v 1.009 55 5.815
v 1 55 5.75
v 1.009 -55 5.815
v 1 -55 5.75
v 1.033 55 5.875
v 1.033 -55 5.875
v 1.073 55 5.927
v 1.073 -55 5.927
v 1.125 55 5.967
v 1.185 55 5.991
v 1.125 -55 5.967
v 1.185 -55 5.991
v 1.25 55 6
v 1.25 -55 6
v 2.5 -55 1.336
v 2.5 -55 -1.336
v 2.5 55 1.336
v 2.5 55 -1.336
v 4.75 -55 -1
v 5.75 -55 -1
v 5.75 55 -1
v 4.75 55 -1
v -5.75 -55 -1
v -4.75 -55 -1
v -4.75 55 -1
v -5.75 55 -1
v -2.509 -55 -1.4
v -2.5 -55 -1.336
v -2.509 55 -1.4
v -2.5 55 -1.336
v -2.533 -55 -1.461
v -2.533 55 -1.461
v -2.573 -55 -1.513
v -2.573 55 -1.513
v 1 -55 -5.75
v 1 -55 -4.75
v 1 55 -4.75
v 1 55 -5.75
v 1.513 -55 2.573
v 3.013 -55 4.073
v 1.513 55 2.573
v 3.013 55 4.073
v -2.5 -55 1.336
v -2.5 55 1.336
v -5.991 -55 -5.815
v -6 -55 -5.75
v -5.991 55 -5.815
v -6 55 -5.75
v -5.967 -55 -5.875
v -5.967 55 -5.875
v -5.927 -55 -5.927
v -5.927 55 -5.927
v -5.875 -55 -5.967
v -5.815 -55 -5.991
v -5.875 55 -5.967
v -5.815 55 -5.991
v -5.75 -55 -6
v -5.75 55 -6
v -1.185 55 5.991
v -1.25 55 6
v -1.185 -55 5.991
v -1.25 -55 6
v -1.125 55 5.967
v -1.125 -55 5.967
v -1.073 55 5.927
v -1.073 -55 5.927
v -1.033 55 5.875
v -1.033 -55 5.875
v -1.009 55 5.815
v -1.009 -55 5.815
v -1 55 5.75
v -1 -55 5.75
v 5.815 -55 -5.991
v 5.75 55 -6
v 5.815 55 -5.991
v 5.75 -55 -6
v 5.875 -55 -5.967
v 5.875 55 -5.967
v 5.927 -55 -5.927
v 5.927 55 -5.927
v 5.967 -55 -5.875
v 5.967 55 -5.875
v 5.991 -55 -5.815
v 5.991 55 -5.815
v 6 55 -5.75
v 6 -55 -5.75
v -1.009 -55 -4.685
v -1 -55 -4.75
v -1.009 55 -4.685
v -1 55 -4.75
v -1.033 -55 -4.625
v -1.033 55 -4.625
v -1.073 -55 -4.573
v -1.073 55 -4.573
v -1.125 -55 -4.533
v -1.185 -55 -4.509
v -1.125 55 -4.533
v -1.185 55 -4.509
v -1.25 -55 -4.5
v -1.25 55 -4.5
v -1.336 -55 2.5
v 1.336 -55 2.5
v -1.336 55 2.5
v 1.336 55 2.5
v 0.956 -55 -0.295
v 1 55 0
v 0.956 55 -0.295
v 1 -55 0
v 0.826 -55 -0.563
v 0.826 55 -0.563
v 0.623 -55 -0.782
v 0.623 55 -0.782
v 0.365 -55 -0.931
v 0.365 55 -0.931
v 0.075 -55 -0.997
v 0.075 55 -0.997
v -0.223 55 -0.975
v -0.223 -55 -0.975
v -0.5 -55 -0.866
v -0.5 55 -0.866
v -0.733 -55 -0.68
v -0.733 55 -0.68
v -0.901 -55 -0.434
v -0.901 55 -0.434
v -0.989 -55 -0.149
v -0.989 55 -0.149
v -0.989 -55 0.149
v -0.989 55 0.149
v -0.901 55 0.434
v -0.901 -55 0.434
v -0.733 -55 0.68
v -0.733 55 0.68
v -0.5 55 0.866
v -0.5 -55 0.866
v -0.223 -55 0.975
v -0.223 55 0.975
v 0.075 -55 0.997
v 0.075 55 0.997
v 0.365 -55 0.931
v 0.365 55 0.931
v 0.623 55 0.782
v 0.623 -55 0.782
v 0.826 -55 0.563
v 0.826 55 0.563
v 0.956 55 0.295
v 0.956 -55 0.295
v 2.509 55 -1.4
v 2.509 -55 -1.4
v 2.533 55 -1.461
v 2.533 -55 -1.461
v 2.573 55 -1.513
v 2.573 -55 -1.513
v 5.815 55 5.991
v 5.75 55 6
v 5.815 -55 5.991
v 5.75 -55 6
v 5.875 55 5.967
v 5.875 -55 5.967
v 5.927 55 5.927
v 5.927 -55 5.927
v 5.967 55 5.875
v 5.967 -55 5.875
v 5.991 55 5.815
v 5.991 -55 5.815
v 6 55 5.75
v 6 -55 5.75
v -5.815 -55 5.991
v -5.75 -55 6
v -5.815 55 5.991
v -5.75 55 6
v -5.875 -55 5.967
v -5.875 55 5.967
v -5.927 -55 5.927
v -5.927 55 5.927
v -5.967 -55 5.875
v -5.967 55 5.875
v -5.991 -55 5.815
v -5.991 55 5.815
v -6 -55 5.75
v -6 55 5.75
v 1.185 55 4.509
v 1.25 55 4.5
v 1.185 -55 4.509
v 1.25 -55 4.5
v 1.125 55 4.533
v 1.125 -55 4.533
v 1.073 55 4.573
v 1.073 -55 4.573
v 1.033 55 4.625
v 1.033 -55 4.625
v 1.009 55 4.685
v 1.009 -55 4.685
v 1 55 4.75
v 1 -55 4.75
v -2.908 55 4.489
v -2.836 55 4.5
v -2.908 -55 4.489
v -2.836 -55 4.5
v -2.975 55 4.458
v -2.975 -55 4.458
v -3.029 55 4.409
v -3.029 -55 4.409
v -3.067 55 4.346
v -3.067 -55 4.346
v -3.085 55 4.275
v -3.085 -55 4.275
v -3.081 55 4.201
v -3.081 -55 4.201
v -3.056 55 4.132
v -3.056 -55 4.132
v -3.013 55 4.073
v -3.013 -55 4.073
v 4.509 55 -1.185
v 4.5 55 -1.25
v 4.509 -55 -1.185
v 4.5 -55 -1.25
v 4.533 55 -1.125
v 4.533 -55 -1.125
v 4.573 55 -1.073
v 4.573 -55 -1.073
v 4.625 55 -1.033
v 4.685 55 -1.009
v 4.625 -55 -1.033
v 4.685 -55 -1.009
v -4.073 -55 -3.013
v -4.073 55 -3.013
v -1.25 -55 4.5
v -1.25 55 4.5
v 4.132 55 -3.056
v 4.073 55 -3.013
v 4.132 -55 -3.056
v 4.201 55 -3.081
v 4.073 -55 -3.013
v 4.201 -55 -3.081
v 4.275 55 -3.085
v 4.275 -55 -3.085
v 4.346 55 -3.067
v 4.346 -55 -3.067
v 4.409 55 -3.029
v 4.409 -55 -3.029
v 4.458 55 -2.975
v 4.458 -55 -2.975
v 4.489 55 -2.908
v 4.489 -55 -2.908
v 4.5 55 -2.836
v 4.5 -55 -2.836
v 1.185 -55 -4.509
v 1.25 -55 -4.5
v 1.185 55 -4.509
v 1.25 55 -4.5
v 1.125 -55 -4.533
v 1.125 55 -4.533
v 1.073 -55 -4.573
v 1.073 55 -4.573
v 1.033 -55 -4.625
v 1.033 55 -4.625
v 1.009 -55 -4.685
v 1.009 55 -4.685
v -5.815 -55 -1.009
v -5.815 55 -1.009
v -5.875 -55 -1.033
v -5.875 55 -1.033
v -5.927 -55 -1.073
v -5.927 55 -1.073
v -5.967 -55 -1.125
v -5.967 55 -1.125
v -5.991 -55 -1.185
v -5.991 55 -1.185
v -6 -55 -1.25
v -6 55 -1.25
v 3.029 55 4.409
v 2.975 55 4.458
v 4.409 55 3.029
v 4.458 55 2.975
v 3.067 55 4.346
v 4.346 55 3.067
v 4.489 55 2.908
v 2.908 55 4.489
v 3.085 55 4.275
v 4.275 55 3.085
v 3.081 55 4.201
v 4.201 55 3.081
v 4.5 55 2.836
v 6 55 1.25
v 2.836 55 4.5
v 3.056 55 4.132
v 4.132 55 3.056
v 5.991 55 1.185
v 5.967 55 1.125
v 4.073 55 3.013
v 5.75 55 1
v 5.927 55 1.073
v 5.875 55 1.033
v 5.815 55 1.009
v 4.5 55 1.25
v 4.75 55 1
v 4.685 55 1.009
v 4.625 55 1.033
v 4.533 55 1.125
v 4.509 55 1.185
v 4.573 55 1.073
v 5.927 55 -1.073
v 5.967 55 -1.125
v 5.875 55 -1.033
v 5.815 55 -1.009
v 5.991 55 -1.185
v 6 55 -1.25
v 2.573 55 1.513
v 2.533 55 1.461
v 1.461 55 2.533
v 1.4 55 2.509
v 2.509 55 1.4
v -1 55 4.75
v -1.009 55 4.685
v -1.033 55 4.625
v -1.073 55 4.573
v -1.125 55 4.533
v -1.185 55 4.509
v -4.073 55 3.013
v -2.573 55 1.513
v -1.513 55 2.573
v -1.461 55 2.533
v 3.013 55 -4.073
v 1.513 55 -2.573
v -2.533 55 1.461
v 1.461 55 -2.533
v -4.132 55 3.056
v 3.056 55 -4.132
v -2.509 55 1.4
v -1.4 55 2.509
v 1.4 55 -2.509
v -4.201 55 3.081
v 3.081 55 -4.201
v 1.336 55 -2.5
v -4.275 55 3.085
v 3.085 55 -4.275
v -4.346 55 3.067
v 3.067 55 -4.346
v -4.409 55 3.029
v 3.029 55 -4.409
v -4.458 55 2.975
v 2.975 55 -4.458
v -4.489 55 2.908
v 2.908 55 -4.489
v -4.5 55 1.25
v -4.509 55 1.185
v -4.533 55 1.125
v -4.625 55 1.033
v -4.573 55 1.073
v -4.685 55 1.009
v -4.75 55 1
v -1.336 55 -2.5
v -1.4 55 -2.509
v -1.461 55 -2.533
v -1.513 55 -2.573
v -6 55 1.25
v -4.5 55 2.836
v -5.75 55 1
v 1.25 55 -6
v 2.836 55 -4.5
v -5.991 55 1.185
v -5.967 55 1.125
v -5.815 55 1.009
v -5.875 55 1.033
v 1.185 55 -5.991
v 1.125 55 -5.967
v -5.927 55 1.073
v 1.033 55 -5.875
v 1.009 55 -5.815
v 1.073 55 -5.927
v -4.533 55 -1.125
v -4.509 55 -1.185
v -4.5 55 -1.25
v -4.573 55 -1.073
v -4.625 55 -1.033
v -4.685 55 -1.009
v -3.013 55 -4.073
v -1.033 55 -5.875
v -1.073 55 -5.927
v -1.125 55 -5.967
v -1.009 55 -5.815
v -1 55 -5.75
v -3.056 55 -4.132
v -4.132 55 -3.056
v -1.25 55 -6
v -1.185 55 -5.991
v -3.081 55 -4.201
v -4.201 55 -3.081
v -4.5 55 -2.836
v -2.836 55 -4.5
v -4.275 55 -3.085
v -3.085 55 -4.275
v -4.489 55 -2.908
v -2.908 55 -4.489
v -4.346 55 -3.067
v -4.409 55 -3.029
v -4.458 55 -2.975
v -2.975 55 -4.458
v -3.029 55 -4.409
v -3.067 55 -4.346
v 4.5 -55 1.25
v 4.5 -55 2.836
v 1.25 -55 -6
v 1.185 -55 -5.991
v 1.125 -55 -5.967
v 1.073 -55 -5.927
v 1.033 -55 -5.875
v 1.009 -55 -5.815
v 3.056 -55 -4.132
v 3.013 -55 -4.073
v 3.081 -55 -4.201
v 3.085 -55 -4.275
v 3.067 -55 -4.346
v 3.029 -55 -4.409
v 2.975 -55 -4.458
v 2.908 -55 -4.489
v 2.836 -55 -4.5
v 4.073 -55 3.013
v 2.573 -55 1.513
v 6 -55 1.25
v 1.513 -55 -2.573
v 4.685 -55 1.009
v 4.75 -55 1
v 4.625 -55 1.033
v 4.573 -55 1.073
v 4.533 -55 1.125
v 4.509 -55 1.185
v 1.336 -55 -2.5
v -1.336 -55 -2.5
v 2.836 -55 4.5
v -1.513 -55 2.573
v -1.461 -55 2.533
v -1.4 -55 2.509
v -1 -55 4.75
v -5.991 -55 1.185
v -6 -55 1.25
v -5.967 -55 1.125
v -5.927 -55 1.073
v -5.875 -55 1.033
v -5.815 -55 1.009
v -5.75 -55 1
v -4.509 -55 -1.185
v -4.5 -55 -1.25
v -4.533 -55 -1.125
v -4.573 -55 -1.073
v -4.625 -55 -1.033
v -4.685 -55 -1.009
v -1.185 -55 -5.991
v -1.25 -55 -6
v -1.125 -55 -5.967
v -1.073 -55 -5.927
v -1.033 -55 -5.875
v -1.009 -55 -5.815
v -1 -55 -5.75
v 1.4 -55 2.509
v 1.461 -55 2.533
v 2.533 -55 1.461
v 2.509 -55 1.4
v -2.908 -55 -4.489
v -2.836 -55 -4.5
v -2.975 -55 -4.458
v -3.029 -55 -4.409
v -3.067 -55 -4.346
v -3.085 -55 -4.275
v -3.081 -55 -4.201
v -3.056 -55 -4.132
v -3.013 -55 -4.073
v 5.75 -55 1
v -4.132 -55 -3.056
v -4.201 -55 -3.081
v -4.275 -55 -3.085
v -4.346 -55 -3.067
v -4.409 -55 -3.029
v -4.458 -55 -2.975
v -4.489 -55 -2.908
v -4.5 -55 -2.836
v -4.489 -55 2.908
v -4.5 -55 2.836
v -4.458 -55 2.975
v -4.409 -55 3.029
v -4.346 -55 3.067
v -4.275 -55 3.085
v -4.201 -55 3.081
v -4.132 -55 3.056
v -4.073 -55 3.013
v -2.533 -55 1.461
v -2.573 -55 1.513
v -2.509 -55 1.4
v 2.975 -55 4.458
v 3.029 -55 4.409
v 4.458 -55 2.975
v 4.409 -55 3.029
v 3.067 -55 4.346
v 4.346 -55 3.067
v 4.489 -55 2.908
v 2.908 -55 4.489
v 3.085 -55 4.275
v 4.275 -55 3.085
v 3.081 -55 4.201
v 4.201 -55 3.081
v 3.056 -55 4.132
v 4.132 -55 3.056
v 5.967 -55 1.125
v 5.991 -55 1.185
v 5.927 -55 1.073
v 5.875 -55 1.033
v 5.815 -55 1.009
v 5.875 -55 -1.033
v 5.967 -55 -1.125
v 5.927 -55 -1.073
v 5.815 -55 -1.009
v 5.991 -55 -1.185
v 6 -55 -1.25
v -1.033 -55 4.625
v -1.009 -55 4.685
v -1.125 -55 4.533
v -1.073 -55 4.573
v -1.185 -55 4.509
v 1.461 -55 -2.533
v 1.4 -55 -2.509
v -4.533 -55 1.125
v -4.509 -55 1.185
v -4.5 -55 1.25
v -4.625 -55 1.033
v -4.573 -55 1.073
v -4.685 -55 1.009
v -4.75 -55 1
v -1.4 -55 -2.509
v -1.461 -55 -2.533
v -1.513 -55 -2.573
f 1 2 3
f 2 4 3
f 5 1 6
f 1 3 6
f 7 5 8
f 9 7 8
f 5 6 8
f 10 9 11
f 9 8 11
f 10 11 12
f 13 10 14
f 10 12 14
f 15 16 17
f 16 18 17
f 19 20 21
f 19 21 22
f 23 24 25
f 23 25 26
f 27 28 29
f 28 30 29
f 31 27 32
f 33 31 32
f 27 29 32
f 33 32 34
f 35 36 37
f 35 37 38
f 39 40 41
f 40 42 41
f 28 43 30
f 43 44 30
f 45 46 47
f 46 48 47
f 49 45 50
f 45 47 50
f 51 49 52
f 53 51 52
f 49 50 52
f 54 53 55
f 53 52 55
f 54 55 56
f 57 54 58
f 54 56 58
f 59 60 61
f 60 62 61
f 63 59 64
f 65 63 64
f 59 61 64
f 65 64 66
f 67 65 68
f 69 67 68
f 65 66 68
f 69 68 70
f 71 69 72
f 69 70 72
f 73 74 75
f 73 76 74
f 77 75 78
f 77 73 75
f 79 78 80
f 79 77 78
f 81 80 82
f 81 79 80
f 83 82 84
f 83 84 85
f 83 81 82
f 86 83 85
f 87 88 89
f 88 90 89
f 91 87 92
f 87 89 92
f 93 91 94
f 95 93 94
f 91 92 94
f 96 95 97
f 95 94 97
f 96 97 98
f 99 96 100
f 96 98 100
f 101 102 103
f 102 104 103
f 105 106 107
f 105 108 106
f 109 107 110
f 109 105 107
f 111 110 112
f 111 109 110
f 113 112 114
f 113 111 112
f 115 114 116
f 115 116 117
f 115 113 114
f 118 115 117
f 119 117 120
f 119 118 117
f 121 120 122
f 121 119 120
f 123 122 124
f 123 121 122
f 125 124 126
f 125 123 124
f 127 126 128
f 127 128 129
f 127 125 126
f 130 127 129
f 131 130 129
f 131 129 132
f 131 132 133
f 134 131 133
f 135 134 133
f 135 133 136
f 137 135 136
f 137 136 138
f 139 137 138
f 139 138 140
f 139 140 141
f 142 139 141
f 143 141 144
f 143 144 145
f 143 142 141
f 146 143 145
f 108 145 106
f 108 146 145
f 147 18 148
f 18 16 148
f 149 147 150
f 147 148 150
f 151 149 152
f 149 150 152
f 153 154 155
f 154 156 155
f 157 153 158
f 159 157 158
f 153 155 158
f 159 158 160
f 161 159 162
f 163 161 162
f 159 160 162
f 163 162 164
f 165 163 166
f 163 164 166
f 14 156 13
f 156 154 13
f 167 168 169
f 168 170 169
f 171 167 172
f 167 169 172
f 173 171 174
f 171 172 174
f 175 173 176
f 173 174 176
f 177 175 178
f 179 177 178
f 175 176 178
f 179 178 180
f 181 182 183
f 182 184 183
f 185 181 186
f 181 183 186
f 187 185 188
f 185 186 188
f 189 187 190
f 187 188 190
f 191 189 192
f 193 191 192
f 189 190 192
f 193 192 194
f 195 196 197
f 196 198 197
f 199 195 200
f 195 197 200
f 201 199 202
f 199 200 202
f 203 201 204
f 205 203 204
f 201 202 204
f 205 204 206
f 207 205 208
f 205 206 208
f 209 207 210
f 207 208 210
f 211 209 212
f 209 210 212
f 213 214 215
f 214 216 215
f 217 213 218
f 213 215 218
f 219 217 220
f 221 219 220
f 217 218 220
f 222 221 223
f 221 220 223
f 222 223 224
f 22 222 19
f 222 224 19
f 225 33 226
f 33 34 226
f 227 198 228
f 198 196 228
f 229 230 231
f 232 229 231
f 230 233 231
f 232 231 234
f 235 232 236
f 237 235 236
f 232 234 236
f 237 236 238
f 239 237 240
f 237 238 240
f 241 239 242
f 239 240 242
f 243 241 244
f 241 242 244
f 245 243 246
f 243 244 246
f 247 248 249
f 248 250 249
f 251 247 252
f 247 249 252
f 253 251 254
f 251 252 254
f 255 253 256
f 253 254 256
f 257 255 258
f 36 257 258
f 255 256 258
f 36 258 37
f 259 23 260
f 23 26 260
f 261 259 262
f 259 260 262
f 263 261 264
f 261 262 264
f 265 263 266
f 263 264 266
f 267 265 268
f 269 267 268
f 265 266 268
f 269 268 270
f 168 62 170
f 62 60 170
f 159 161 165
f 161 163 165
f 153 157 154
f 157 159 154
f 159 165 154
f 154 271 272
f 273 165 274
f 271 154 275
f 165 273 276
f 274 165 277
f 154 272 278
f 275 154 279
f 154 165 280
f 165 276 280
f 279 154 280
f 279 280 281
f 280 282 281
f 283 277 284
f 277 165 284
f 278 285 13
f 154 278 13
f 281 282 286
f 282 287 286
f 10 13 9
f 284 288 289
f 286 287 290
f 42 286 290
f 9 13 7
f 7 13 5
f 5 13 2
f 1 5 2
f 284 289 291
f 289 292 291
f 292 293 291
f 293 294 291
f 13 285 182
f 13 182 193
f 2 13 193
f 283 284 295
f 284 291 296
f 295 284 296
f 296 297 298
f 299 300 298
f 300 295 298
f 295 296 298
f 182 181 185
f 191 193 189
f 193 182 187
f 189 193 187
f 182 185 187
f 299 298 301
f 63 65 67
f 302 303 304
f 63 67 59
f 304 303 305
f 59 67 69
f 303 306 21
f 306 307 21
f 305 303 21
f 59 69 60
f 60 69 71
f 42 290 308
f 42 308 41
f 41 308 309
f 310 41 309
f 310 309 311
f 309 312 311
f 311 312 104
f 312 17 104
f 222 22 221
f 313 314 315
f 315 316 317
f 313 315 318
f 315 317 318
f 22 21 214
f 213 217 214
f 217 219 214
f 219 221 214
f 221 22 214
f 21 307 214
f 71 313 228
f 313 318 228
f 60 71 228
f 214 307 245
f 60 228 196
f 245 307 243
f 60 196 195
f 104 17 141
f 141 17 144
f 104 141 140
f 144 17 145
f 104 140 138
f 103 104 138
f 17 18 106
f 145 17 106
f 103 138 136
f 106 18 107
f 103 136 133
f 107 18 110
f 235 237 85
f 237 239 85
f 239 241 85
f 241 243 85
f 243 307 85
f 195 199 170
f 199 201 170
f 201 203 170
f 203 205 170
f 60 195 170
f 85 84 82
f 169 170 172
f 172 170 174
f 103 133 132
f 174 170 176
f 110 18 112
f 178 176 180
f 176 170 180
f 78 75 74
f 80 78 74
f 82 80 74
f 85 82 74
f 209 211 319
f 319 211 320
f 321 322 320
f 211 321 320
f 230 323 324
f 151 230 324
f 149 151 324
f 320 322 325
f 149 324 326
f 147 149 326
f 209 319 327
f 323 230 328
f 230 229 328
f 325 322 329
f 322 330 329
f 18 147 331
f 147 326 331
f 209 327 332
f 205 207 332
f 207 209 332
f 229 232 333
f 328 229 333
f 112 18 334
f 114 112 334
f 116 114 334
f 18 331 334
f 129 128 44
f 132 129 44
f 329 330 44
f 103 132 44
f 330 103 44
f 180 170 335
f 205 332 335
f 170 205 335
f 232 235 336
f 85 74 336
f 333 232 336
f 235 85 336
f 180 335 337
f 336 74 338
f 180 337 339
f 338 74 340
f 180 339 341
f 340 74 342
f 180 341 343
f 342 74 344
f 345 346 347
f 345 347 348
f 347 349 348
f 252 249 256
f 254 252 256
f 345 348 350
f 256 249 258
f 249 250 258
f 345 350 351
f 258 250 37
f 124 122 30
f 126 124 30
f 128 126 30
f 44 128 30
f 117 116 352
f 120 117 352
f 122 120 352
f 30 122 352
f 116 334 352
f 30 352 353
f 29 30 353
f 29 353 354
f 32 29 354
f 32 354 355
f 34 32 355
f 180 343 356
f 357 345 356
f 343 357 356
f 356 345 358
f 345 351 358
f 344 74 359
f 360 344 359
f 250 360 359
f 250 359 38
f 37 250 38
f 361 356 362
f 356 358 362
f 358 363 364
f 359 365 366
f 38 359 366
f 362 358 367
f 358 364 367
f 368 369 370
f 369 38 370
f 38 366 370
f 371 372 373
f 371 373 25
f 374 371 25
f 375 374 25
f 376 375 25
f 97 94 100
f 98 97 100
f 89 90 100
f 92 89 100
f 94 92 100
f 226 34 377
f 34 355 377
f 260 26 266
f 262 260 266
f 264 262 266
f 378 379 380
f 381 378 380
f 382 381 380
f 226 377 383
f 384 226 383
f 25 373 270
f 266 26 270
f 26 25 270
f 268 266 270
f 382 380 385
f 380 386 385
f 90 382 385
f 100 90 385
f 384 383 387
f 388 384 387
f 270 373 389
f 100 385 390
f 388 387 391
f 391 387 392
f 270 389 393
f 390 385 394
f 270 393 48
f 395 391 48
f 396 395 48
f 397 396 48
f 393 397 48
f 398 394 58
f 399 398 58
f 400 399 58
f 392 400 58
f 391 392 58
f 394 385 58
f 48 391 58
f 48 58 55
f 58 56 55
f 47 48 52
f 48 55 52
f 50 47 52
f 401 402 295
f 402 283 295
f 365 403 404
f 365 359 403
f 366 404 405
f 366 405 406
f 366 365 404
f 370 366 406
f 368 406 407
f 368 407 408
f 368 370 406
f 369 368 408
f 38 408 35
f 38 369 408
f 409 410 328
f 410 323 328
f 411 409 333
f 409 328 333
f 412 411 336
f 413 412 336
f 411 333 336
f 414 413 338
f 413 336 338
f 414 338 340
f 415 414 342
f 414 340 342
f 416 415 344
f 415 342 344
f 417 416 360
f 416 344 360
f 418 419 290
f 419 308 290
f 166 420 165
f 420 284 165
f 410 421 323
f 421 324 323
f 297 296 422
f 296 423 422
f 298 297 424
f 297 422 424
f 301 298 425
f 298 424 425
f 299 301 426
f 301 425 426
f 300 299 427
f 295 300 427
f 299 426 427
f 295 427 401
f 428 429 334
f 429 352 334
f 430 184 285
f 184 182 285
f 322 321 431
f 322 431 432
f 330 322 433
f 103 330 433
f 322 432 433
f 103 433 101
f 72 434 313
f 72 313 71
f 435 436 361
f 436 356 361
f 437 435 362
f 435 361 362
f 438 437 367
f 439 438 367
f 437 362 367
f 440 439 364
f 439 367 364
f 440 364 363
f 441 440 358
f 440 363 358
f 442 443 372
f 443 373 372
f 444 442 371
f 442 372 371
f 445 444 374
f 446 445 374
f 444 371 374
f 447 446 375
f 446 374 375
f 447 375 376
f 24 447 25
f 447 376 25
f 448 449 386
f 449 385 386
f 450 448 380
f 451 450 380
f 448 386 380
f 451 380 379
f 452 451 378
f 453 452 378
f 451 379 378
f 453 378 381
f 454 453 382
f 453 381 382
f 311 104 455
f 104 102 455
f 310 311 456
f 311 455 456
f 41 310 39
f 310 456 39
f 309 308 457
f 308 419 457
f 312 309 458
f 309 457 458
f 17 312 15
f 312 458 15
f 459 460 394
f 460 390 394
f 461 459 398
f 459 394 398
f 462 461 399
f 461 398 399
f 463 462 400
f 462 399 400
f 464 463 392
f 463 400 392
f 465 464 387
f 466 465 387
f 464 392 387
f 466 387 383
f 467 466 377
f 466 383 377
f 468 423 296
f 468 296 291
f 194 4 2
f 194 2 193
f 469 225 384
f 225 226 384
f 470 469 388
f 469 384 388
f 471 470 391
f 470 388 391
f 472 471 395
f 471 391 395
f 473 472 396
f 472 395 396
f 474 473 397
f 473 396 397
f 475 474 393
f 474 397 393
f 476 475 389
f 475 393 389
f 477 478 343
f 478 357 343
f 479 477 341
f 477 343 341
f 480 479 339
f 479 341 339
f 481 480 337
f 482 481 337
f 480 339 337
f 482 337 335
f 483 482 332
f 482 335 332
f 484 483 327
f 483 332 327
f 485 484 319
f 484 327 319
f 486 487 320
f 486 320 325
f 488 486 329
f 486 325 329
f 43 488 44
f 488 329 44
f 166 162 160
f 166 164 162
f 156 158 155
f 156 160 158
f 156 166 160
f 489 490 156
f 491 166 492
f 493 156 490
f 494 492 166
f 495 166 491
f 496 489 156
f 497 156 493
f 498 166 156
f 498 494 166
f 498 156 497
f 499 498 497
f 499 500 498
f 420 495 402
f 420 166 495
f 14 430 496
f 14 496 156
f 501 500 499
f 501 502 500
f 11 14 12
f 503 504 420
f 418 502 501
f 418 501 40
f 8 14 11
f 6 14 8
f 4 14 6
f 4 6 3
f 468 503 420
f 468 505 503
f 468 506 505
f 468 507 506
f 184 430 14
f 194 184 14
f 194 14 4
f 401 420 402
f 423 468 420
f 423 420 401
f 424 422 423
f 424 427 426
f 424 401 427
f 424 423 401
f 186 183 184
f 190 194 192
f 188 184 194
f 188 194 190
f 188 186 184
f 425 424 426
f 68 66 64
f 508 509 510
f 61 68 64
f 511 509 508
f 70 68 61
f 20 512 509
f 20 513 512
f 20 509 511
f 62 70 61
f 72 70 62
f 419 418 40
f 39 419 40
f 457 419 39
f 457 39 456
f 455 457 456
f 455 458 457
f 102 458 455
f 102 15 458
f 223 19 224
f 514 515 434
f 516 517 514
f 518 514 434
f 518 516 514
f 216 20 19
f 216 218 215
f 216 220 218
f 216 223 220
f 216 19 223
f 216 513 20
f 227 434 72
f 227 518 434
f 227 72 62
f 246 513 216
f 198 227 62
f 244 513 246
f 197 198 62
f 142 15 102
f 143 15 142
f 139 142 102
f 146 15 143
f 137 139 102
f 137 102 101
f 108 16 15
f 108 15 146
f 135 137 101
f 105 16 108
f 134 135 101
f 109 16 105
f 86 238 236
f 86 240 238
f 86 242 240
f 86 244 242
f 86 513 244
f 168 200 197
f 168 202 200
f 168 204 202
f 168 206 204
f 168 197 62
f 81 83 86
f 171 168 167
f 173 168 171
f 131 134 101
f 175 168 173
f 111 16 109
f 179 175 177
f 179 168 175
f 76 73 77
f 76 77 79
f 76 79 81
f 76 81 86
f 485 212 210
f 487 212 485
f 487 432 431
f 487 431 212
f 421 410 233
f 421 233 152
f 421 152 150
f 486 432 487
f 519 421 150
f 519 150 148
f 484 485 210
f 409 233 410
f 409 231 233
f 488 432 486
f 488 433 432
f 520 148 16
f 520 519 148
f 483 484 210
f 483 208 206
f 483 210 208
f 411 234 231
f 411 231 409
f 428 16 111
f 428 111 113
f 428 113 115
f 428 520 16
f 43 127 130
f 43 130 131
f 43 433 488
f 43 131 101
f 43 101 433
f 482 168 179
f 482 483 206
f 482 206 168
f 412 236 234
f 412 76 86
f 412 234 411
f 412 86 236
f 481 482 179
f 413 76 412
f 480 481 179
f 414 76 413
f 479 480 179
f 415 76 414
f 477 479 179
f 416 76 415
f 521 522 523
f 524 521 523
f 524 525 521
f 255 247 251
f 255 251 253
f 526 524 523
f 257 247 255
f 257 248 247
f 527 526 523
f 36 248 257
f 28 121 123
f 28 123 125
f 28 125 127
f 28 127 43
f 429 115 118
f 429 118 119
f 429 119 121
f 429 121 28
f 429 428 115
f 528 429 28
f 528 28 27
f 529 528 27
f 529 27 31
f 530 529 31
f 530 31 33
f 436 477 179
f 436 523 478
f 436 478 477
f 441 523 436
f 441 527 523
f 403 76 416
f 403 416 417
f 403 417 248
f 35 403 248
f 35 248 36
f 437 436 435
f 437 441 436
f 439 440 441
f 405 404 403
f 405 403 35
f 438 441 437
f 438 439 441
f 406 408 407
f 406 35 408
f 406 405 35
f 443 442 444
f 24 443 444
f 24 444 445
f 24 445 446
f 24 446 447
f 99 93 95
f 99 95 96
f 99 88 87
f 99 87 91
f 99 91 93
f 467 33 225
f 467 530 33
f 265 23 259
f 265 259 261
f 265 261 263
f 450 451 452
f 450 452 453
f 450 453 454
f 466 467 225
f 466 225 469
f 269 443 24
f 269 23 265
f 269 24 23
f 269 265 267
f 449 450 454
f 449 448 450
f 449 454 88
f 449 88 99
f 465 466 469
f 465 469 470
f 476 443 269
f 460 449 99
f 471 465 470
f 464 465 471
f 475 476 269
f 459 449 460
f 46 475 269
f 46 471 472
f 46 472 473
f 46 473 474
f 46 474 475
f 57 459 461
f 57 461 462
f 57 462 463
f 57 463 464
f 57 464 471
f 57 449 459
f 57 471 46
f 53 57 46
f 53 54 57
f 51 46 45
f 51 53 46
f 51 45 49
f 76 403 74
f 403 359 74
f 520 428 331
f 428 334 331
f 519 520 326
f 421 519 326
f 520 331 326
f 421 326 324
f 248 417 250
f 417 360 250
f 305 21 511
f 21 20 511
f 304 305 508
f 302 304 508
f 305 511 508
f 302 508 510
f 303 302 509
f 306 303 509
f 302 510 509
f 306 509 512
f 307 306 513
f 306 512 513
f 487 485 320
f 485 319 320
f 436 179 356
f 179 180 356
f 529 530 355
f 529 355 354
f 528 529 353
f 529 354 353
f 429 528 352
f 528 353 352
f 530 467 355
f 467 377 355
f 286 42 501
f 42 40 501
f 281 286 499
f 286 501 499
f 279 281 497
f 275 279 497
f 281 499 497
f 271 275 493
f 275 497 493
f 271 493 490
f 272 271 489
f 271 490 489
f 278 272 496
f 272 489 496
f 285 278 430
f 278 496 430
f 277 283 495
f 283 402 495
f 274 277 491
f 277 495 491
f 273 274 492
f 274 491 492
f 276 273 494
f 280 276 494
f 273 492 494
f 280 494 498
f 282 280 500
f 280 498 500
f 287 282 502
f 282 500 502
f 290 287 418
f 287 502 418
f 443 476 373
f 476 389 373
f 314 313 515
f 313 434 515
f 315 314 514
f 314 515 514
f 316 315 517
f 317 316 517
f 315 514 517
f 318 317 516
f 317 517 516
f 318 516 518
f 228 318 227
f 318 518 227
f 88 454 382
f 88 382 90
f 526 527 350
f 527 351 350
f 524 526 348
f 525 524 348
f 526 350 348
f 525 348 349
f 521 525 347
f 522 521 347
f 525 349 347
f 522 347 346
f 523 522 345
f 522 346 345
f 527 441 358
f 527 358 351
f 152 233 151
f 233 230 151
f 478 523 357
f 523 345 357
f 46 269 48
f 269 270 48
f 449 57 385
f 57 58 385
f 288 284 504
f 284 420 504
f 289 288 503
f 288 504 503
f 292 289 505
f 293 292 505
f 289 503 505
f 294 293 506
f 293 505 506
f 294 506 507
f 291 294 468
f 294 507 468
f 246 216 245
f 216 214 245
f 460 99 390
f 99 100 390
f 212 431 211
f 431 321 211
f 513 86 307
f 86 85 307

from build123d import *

# Parameters (mm, degrees)
SKETCH1_R           = 1
BOSS_EXTRUDE2_DEPTH = 55
FILLET2_R           = 0.25


with BuildPart() as part:
    # Sketch1 → Boss-Extrude2 (new body, symmetric)
    with BuildSketch(Plane(origin=(0, 0, 0), x_dir=(1, 0, 0), z_dir=(0, 1, 0))):
        Polygon((1, 6), (6, 6), (6, 1), (4.5, 1), (4.5, 3.439339828), (2.5, 1.439339828), (2.5, -1.439339828), (4.5, -3.439339828), (4.5, -1), (6, -1), (6, -6), (1, -6), (1, -4.5), (3.439339828, -4.5), (1.439339828, -2.5), (-1.439339828, -2.5), (-3.439339828, -4.5), (-1, -4.5), (-1, -6), (-6, -6), (-6, -1), (-4.5, -1), (-4.5, -3.439339828), (-2.5, -1.439339828), (-2.5, 1.439339828), (-4.5, 3.439339828), (-4.5, 1), (-6, 1), (-6, 6), (-1, 6), (-1, 4.5), (-3.439339828, 4.5), (-1.439339828, 2.5), (1.439339828, 2.5), (3.439339828, 4.5), (1, 4.5), align=None)
        Circle(SKETCH1_R, mode=Mode.SUBTRACT)
    extrude(amount=BOSS_EXTRUDE2_DEPTH, both=True)

    # Fillet2
    fillet2_edges = [part.edges().sort_by_distance(p)[0] for p in [
        (6, 0, -6),
        (6, 0, -1),
        (4.5, 0, -1),
        (4.5, 0, -3.439339828),
        (2.5, 0, -1.439339828),
        (2.5, 0, 1.439339828),
        (4.5, 0, 3.439339828),
        (4.5, 0, 1),
        (6, 0, 1),
        (6, 0, 6),
        (1, 0, 6),
        (1, 0, 4.5),
        (3.439339828, 0, 4.5),
        (1.439339828, 0, 2.5),
        (-1.439339828, 0, 2.5),
        (-3.439339828, 0, 4.5),
        (-1, 0, 4.5),
        (-1, 0, 6),
        (-6, 0, 6),
        (-6, 0, 1),
        (-4.5, 0, 1),
        (-4.5, 0, 3.439339828),
        (-2.5, 0, 1.439339828),
        (-2.5, 0, -1.439339828),
        (-4.5, 0, -3.439339828),
        (-4.5, 0, -1),
        (-6, 0, -1),
        (-6, 0, -6),
        (-1, 0, -6),
        (-1, 0, -4.5),
        (-3.439339828, 0, -4.5),
        (-1.439339828, 0, -2.5),
        (1.439339828, 0, -2.5),
        (3.439339828, 0, -4.5),
        (1, 0, -4.5),
        (1, 0, -6),
    ]]
    fillet(fillet2_edges, radius=FILLET2_R)


solid = part.part
